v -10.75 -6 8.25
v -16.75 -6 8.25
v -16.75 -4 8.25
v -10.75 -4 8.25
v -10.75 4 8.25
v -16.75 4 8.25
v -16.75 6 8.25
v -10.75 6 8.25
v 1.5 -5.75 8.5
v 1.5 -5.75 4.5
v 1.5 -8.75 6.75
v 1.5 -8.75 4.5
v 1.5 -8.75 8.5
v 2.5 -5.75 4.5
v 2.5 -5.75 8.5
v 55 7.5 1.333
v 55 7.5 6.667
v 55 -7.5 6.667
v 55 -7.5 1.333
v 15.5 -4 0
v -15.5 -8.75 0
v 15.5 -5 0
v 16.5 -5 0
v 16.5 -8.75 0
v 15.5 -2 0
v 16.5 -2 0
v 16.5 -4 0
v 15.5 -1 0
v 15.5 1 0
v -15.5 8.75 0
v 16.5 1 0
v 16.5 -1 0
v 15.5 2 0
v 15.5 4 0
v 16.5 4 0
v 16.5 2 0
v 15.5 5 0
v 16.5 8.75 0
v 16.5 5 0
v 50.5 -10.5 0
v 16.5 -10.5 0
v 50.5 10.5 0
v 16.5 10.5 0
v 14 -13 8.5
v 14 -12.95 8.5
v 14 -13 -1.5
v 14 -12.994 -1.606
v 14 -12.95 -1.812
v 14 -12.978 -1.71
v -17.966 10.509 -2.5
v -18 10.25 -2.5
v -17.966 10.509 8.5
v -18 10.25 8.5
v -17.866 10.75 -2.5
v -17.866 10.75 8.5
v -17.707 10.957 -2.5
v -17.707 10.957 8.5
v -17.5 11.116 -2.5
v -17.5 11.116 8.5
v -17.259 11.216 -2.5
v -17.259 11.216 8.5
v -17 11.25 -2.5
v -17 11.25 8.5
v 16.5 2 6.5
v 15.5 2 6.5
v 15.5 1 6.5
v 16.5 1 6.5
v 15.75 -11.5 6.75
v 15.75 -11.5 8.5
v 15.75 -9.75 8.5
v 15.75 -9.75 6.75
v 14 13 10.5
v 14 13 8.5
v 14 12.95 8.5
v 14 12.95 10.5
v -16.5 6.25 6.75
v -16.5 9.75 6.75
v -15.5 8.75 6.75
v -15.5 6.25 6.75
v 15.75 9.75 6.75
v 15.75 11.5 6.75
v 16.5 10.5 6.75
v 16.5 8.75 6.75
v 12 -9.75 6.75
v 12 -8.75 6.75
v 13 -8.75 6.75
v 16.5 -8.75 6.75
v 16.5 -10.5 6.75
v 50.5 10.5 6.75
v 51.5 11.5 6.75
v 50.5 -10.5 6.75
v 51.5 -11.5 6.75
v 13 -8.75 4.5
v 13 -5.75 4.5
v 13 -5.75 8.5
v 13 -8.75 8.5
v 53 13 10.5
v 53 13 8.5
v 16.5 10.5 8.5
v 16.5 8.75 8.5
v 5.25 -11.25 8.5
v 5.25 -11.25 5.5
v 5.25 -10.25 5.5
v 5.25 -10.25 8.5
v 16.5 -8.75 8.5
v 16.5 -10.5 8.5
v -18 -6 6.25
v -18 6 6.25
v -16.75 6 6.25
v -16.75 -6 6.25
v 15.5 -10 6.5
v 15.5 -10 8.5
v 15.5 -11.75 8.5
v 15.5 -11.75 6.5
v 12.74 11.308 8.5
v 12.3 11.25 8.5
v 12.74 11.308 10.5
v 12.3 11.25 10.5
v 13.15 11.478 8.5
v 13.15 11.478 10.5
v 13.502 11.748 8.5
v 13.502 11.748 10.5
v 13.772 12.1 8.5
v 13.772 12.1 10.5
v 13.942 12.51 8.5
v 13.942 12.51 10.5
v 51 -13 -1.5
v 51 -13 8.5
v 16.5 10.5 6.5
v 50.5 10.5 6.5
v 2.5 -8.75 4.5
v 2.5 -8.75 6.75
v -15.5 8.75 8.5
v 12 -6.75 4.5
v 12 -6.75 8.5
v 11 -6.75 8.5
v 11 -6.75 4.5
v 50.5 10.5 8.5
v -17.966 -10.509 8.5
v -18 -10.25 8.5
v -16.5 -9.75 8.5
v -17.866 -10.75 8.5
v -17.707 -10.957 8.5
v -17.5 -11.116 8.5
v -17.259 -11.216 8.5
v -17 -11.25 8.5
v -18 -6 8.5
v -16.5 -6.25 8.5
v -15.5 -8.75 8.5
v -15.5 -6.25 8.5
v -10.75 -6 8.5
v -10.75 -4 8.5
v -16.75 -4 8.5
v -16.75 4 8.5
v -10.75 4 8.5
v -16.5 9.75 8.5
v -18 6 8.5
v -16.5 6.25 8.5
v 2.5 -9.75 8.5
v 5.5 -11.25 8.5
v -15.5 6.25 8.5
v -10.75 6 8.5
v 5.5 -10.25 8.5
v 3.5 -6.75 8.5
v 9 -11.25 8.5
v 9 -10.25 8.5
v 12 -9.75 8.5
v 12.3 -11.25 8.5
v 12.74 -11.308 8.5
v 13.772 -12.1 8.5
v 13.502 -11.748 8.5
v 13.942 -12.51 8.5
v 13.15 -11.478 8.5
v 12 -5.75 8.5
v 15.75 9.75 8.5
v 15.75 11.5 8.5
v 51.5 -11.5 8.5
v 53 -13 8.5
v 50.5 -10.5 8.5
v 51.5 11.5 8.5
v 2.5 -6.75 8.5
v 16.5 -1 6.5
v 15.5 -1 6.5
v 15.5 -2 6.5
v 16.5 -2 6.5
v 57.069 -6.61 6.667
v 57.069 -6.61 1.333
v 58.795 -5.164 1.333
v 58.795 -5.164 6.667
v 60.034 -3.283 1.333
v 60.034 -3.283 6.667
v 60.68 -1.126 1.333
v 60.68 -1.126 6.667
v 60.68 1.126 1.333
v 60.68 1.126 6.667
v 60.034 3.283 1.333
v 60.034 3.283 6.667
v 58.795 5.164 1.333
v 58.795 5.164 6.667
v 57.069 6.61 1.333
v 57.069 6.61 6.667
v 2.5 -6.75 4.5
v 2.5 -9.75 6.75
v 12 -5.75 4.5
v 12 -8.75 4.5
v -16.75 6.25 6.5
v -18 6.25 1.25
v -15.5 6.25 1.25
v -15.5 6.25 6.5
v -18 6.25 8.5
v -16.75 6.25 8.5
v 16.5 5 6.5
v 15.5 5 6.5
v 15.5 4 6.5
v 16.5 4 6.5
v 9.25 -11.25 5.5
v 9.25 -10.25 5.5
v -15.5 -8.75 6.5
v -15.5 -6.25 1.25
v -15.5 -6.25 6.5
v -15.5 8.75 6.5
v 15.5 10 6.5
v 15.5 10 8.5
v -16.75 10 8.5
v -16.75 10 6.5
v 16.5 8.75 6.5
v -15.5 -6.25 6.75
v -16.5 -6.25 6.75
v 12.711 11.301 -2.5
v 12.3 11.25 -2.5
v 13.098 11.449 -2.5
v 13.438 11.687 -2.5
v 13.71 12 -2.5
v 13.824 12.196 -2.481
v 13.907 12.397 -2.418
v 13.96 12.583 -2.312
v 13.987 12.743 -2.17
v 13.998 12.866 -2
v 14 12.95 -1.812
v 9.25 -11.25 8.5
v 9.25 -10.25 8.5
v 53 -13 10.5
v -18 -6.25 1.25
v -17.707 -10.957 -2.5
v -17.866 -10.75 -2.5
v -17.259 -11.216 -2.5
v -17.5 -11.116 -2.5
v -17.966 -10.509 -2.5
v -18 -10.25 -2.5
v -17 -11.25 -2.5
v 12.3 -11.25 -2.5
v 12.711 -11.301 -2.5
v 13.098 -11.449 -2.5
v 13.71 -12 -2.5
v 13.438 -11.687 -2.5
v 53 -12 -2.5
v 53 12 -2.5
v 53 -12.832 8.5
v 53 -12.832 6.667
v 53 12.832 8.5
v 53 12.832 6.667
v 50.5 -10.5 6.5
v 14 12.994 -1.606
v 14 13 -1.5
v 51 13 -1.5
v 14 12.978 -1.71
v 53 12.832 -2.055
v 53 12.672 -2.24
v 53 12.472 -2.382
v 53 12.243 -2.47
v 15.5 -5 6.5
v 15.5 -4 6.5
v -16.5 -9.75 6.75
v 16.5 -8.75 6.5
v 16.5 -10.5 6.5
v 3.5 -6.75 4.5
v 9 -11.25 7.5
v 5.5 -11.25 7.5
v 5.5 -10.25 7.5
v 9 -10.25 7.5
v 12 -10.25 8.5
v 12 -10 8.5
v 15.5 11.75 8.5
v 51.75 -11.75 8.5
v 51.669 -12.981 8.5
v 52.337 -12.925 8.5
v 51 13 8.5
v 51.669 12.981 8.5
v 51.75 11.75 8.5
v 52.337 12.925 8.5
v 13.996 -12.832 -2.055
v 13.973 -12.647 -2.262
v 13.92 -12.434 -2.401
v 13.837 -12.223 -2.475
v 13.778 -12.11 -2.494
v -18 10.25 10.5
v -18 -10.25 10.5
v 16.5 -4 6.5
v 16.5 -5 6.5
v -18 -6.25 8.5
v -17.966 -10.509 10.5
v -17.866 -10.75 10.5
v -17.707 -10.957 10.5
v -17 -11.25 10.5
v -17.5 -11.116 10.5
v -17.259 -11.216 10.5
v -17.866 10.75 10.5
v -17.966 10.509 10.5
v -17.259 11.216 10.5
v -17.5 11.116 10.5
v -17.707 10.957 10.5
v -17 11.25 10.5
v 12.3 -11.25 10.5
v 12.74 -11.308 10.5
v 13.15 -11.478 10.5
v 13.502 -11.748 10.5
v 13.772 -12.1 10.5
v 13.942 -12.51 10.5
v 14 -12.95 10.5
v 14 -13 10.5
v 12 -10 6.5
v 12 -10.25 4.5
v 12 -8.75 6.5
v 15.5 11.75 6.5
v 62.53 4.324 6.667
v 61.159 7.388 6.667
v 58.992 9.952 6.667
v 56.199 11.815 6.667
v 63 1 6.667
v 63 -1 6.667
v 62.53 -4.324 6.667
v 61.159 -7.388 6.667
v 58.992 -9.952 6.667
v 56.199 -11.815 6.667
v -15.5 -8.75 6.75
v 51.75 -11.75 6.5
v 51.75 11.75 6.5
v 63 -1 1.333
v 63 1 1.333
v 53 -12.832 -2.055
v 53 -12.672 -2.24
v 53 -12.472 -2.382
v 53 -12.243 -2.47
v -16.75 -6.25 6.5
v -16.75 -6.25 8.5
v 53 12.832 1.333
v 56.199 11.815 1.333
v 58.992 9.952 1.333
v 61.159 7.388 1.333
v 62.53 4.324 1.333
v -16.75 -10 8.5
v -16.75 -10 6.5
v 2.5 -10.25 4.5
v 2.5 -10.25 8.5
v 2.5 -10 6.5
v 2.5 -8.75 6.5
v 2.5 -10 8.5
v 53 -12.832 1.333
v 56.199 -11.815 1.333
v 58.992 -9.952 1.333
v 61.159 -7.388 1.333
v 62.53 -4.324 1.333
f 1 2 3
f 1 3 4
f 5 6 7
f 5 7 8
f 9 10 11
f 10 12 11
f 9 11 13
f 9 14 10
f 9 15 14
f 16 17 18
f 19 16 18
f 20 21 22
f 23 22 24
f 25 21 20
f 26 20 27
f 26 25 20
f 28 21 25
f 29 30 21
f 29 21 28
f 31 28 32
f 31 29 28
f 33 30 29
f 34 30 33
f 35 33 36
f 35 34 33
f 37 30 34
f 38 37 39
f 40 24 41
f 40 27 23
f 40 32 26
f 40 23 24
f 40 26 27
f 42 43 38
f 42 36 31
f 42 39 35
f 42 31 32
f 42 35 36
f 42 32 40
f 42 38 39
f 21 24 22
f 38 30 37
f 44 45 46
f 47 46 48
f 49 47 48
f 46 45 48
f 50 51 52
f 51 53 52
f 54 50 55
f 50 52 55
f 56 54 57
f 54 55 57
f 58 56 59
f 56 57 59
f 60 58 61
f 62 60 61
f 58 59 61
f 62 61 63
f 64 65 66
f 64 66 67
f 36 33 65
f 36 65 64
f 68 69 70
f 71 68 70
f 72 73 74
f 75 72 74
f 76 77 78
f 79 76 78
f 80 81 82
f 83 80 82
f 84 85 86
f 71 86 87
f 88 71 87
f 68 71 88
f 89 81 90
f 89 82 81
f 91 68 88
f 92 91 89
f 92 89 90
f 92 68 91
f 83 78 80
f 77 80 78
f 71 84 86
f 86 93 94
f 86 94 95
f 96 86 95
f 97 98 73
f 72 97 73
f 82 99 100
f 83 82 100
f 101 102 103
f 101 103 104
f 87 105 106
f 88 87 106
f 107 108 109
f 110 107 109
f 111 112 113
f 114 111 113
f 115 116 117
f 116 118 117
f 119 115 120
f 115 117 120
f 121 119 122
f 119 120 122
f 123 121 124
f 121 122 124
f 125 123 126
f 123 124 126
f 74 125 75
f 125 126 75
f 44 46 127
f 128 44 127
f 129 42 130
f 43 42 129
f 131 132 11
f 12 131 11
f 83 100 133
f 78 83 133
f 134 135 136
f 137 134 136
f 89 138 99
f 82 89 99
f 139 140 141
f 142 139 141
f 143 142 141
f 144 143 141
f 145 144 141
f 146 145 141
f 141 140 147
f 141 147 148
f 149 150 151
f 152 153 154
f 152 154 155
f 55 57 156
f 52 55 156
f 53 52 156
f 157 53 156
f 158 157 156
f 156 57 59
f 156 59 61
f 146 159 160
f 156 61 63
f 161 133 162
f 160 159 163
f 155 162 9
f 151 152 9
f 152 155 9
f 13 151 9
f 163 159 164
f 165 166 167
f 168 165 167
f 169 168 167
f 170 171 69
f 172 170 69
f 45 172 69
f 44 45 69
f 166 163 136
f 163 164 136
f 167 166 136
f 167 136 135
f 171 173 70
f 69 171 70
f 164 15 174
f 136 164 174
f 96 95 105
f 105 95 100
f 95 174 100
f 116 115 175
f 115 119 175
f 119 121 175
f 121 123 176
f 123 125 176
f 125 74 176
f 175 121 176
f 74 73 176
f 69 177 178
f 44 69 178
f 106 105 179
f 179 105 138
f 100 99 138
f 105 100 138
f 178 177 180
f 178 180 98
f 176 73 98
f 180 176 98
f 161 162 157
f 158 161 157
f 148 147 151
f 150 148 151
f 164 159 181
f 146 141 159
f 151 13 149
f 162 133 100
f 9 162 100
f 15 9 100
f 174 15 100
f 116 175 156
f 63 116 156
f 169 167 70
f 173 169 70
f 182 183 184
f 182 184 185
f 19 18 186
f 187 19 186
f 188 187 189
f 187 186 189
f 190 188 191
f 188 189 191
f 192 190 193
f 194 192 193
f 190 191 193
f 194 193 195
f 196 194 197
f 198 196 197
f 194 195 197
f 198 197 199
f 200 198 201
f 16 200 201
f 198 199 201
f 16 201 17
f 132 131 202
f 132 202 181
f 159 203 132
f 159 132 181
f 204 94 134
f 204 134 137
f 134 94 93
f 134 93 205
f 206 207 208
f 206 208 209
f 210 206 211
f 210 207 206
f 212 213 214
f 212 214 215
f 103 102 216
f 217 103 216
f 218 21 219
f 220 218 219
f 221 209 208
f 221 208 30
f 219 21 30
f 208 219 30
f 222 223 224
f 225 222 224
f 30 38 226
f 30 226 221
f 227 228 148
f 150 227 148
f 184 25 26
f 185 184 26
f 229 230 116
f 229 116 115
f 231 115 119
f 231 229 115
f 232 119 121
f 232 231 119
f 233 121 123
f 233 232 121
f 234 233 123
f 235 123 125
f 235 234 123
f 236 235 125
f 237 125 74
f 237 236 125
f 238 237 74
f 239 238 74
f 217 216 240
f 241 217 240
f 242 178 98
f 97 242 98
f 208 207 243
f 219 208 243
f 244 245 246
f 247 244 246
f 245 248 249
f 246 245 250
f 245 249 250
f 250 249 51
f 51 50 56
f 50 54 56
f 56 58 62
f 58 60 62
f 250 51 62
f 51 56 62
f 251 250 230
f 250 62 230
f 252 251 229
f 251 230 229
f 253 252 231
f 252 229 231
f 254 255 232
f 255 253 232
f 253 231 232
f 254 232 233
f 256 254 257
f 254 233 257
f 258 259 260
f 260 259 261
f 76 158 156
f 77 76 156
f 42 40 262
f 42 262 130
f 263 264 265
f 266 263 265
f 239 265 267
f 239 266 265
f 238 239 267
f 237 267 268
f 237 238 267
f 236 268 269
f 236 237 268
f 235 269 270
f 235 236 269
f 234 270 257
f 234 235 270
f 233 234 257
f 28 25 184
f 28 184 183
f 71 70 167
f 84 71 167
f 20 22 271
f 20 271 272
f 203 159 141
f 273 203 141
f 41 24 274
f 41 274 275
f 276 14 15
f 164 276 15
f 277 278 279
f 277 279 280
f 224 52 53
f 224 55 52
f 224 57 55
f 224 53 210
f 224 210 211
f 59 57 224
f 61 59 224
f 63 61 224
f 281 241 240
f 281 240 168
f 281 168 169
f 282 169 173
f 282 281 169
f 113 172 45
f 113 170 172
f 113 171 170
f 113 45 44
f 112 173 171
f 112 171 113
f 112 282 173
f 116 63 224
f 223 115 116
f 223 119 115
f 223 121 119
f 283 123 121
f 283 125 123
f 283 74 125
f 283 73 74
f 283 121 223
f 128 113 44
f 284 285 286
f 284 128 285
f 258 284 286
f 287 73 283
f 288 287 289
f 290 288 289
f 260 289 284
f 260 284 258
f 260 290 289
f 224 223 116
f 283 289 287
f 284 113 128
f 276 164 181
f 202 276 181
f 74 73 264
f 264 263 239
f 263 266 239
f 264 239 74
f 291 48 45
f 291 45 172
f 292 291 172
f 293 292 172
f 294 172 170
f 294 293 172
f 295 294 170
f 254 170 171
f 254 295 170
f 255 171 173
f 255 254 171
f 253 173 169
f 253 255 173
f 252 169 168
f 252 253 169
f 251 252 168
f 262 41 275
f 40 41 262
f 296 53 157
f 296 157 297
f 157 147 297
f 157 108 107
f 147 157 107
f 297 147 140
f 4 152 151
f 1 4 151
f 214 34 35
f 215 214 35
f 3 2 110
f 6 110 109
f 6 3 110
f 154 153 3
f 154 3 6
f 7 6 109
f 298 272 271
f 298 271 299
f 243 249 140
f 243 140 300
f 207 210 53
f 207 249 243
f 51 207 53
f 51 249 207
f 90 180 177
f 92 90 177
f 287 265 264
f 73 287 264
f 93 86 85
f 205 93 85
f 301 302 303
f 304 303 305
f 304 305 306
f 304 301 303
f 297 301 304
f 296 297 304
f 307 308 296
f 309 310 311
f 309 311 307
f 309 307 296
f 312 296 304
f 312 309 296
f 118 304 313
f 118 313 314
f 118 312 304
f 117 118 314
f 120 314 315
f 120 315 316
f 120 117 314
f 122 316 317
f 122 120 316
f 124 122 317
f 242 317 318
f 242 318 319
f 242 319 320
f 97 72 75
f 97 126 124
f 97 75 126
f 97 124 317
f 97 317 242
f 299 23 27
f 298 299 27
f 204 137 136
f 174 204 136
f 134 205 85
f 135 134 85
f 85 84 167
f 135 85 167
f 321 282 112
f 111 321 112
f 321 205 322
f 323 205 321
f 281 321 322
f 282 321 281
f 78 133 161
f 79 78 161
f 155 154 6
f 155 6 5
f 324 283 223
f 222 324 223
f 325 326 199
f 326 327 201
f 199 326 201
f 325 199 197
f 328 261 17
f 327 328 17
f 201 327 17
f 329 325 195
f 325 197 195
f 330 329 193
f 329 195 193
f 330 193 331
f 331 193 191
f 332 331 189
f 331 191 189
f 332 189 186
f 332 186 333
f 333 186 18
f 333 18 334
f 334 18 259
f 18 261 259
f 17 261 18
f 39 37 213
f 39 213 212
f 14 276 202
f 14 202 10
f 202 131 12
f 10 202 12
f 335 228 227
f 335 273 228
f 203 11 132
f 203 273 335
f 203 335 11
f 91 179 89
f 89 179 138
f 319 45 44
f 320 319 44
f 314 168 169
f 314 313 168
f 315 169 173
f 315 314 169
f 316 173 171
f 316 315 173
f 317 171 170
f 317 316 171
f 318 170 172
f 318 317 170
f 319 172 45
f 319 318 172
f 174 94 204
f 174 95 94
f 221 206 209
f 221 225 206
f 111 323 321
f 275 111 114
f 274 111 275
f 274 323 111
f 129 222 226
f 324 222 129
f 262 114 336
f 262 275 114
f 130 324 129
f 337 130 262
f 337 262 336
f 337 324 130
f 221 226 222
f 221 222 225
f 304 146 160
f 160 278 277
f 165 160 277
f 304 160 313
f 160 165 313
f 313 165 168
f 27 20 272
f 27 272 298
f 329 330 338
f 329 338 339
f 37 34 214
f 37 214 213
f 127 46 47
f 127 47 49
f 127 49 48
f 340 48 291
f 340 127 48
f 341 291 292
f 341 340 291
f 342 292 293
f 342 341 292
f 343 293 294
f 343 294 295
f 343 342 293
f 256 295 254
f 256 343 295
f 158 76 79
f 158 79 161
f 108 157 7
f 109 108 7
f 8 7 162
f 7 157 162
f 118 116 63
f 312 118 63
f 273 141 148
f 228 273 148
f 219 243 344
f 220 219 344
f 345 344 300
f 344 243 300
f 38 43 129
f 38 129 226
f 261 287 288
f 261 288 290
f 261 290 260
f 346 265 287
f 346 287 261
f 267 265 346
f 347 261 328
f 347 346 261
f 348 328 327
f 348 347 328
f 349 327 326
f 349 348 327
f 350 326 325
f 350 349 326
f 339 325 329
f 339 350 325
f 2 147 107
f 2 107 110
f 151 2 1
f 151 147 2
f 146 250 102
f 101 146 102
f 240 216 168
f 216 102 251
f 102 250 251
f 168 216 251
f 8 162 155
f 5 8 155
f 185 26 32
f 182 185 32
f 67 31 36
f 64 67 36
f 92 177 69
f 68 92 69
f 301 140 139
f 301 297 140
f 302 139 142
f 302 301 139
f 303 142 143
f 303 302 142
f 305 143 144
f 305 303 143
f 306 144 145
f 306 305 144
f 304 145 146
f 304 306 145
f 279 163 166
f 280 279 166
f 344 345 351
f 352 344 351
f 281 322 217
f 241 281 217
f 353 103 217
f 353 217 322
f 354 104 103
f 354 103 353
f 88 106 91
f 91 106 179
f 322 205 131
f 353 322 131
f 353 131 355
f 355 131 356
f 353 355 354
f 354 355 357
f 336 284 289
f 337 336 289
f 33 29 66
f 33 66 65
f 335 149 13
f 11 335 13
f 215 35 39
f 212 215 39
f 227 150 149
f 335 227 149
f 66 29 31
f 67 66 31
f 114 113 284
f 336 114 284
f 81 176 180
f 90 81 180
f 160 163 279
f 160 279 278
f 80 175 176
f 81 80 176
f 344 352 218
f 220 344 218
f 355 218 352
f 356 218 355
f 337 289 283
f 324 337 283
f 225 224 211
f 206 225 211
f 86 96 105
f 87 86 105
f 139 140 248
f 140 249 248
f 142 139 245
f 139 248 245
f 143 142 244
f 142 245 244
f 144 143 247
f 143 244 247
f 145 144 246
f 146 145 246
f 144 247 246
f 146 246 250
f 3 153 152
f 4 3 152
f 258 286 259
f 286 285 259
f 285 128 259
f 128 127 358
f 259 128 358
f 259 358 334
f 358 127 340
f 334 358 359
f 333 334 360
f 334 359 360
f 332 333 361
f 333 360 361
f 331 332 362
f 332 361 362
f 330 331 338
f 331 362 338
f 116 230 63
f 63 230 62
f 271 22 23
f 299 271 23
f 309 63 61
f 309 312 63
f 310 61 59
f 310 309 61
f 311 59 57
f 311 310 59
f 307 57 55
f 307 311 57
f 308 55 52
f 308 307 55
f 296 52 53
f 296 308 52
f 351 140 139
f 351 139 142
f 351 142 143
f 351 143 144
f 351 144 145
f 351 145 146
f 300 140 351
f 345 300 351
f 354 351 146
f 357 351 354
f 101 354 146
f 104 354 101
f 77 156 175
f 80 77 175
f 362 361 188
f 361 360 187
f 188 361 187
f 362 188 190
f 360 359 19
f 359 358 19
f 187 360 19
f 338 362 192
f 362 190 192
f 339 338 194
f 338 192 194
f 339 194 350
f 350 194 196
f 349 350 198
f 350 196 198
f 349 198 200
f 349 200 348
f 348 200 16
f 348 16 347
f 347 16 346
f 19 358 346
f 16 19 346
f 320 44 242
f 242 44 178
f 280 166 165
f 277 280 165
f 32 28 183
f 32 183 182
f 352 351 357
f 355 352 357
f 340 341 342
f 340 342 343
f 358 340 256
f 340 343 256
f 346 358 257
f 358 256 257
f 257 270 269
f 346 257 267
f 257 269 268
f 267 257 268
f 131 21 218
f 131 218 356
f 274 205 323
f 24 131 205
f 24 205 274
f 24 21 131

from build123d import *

# Parameters (mm, degrees)
F0_W         = 31
F0_H         = 17.5
F0_W_2       = 1
F1_DEPTH     = 8.5
F2_T         = 2.5
F3_W         = 1
F3_H         = 1
F4_DEPTH     = 6.5
F5_R         = 1
F6_W         = 9.5
F6_H         = 6
F8_DEPTH     = 1.5
F7_W         = 4
F7_H         = 4
F9_DEPTH     = 2
F11_DEPTH    = 2
F13_DEPTH    = 2
F14_R        = 1
F15_R        = 1.7
F15_2_R      = 1.7
F17_DEPTH    = 1.75
F18_W        = 12.5
F18_H        = 7.25
F19_DEPTH    = 3
F20_W        = 1.25
F20_H        = 12
F21_DEPTH    = 2.25
F22_W        = 3.5
F22_H        = 1
F23_DEPTH    = 1
F24_W        = 1
F24_H        = 4
F25_DEPTH    = 2
F26_W        = 2
F26_H        = 4
F27_DEPTH    = 1
F28_SIZE     = 0.99999
F29_W        = 6
F29_H        = 2
F30_DEPTH    = 0.25
F32_DEPTH    = 10
F33_T1_DEPTH = 65.3331902927
F35_DEPTH    = 10


# Not quite as in the source:
# - a fillet or chamfer that OpenCascade refuses, or shapes differently, is made with other operations: its cross-section is extruded or revolved along the edge and cut away or added
# - a fillet or chamfer is up to 0.001 mm smaller than in the source, because OpenCascade refuses the exact size


with BuildPart() as f1:
    # F0 (on Top) → F1 (new body)
    with BuildSketch(Plane.XY):
        Rectangle(F0_W, F0_H)
        with Locations((16, 0)):
            Rectangle(F0_W_2, F0_H)
        Polygon((16.5, 10.5), (16.5, 8.75), (16.5, -8.75), (16.5, -10.5), (50.5, -10.5), (50.5, 10.5), align=None)
    extrude(amount=F1_DEPTH)

    # F2
    f2_openings = [f1.faces().sort_by_distance(p)[0] for p in [
        (18.994505, 0, 8.5),
    ]]
    offset(amount=F2_T, openings=f2_openings, kind=Kind.INTERSECTION)

    # F3 (on face) → F4 (join)
    with BuildSketch(Plane.XY):
        with Locations((16, 4.5)):
            Rectangle(F3_W, F3_H)
        with Locations((16, 1.5)):
            Rectangle(F3_W, F3_H)
        with Locations((16, -1.5)):
            Rectangle(F3_W, F3_H)
        with Locations((16, -4.5)):
            Rectangle(F3_W, F3_H)
    extrude(amount=F4_DEPTH)

    # F5
    f5_edges = [f1.edges().sort_by_distance(p)[0] for p in [
        (-18, 11.25, 3),
        (-18, -11.25, 3),
        (33.5, -13, -2.5),
        (33.5, 13, -2.5),
    ]]
    fillet(f5_edges, radius=F5_R)

    # F6 (on face) → F8 (cut, symmetric)
    with BuildSketch(Plane(origin=(0, -8.75, 0), x_dir=(-1, 0, 0), z_dir=(0, 1, 0))):
        with Locations((-7.25, 7.5)):
            Rectangle(F6_W, F6_H)
    extrude(amount=F8_DEPTH, both=True, mode=Mode.SUBTRACT)

    # F7 (on face) → F9 (cut, symmetric)
    with BuildSketch(Plane.XZ.offset(11.25)):
        with Locations((7.25, 7.5)):
            Rectangle(F7_W, F7_H)
    extrude(amount=F9_DEPTH, both=True, mode=Mode.SUBTRACT)

    # F10 (on face) → F11 (cut)
    with BuildSketch(Plane.XY.offset(8.5)):
        Polygon((2.5, -8.75), (-15.5, -8.75), (-15.5, 8.75), (15.5, 8.75), (15.5, 10), (-16.75, 10), (-16.75, 8.75), (-16.75, -10), (2.5, -10), align=None)
        Polygon((15.5, 10), (15.5, 8.75), (16.5, 8.75), (16.5, 10.5), (50.5, 10.5), (50.5, -10.5), (16.5, -10.5), (16.5, -8.75), (12, -8.75), (12, -10), (15.5, -10), (15.5, -11.75), (16.5, -11.75), (51.75, -11.75), (51.75, 10.5), (51.75, 11.75), (50.5, 11.75), (16.5, 11.75), (15.5, 11.75), align=None)
    extrude(amount=-F11_DEPTH, mode=Mode.SUBTRACT)

    # F15#2
    f15_2_edges = [f1.edges().sort_by_distance(p)[0] for p in [
        (14, 11.25, 3),
        (14, -11.25, 3),
    ]]
    fillet(f15_2_edges, radius=F15_2_R)


with BuildPart() as f13:
    # F12 (on face) → F13 (new body)
    with BuildSketch(Plane.XY.offset(8.5)):
        Polygon((14, 11.25), (-18, 11.25), (-18, -11.25), (14, -11.25), (14, -13), (53, -13), (53, 13), (14, 13), align=None)
    extrude(amount=F13_DEPTH)

    # F14
    f14_edges = [f13.edges().sort_by_distance(p)[0] for p in [
        (-18, 11.25, 9.5),
        (-18, -11.25, 9.5),
    ]]
    fillet(f14_edges, radius=F14_R)

    # F15
    f15_edges = [f13.edges().sort_by_distance(p)[0] for p in [
        (14, -11.25, 9.5),
        (14, 11.25, 9.5),
    ]]
    fillet(f15_edges, radius=F15_R)

    # F16 (on face) → F17 (join)
    with BuildSketch(Plane(origin=(0, 0, 8.5), x_dir=(1, 0, 0), z_dir=(0, 0, -1))):
        Polygon((-15.5, -9.75), (-15.5, -8.75), (-15.5, 8.75), (2.5, 8.75), (2.5, 9.75), (-16.5, 9.75), (-16.5, -9.75), align=None)
        Polygon((16.5, -8.75), (-15.5, -8.75), (-15.5, -9.75), (15.75, -9.75), (15.75, -11.5), (51.5, -11.5), (51.5, 11.5), (16.5, 11.5), (15.75, 11.5), (15.75, 9.75), (12, 9.75), (12, 8.75), (16.5, 8.75), (16.5, 10.5), (50.5, 10.5), (50.5, -10.5), (16.5, -10.5), align=None)
    extrude(amount=F17_DEPTH)


with BuildPart() as f19_tool:
    # F18 (on face) → F19 (new body)
    with BuildSketch(Plane(origin=(-18, 0, 0), x_dir=(0, -1, 0), z_dir=(-1, 0, 0))):
        with Locations((0, 4.875)):
            Rectangle(F18_W, F18_H)
    extrude(amount=-F19_DEPTH)


with BuildPart() as f1_1:
    add(f1.part)

    # F19: cut by f19_tool
    add(f19_tool.part, mode=Mode.SUBTRACT)

    # F31 (on face) → F32 (join)
    with BuildSketch(Plane.YZ.offset(53)):
        Polygon((-13, 1.3334048537), (13, 1.3334048537), (13, 6.6665951463), (0, 6.6665951463), (-13, 6.6665951463), align=None)
    extrude(amount=F32_DEPTH)

    # F33: fillet of radius 12 on 2 edges, made by hand

    # F33_s2 → F33_t1 (cut)
    with BuildSketch(Plane.XY.offset(-28.6665951463)):
        with BuildLine():
            ThreePointArc((51, -13), (59.4852813742, -9.4852813742), (63, -1))
            Line((63, -1), (63, -13))
            Line((63, -13), (51, -13))
        make_face()
        with BuildLine():
            ThreePointArc((51, 13), (59.4852813742, 9.4852813742), (63, 1))
            Line((63, 1), (63, 13))
            Line((63, 13), (51, 13))
        make_face()
    extrude(amount=F33_T1_DEPTH, mode=Mode.SUBTRACT)

    # F34 (on face) → F35 (cut, symmetric)
    with BuildSketch(Plane.XY.offset(6.6665951463)):
        with BuildLine():
            Line((55, 0), (55, -7.5))
            ThreePointArc((55, -7.5), (60.7620873481, 0), (55, 7.5))
            Line((55, 7.5), (55, 0))
        make_face()
    extrude(amount=F35_DEPTH, both=True, mode=Mode.SUBTRACT)


with BuildPart() as f13_1:
    add(f13.part)

    # F19: cut by f19_tool
    add(f19_tool.part, mode=Mode.SUBTRACT)

    # F20 (on face) → F21 (join)
    with BuildSketch(Plane.XY.offset(8.5)):
        with Locations((-17.375, 0)):
            Rectangle(F20_W, F20_H)
    extrude(amount=-F21_DEPTH)

    # F22 (on face) → F23 (join)
    with BuildSketch(Plane(origin=(0, 0, 8.5), x_dir=(1, 0, 0), z_dir=(0, 0, -1))):
        with Locations((7.25, 10.75)):
            Rectangle(F22_W, F22_H)
    extrude(amount=F23_DEPTH)

    # F24 (on face) → F25 (join)
    with BuildSketch(Plane(origin=(0, -8.75, 0), x_dir=(-1, 0, 0), z_dir=(0, 1, 0))):
        with Locations((-2, 6.5)):
            Rectangle(F24_W, F24_H)
        with Locations((-12.5, 6.5)):
            Rectangle(F24_W, F24_H)
    extrude(amount=F25_DEPTH)

    # F26 (on face) → F27 (join)
    with BuildSketch(Plane(origin=(0, -6.75, 0), x_dir=(-1, 0, 0), z_dir=(0, 1, 0))):
        with Locations((-2.5, 6.5)):
            Rectangle(F26_W, F26_H)
        with Locations((-12, 6.5)):
            Rectangle(F26_W, F26_H)
    extrude(amount=F27_DEPTH)

    # F28 (size 1 in the source; OpenCascade refuses exactly that, so slightly less here)
    f28_edges = [f13_1.edges().sort_by_distance(p)[0] for p in [
        (3.5, -5.75, 6.5),
        (11, -5.75, 6.5),
    ]]
    chamfer(f28_edges, length=F28_SIZE)

    # F29 (on face) → F30 (join)
    with BuildSketch(Plane(origin=(0, 0, 8.5), x_dir=(1, 0, 0), z_dir=(0, 0, -1))):
        with Locations((-13.75, -5)):
            Rectangle(F29_W, F29_H)
        with Locations((-13.75, 5)):
            Rectangle(F29_W, F29_H)
    extrude(amount=F30_DEPTH)


solid = Compound([f1_1.part, f13_1.part])
